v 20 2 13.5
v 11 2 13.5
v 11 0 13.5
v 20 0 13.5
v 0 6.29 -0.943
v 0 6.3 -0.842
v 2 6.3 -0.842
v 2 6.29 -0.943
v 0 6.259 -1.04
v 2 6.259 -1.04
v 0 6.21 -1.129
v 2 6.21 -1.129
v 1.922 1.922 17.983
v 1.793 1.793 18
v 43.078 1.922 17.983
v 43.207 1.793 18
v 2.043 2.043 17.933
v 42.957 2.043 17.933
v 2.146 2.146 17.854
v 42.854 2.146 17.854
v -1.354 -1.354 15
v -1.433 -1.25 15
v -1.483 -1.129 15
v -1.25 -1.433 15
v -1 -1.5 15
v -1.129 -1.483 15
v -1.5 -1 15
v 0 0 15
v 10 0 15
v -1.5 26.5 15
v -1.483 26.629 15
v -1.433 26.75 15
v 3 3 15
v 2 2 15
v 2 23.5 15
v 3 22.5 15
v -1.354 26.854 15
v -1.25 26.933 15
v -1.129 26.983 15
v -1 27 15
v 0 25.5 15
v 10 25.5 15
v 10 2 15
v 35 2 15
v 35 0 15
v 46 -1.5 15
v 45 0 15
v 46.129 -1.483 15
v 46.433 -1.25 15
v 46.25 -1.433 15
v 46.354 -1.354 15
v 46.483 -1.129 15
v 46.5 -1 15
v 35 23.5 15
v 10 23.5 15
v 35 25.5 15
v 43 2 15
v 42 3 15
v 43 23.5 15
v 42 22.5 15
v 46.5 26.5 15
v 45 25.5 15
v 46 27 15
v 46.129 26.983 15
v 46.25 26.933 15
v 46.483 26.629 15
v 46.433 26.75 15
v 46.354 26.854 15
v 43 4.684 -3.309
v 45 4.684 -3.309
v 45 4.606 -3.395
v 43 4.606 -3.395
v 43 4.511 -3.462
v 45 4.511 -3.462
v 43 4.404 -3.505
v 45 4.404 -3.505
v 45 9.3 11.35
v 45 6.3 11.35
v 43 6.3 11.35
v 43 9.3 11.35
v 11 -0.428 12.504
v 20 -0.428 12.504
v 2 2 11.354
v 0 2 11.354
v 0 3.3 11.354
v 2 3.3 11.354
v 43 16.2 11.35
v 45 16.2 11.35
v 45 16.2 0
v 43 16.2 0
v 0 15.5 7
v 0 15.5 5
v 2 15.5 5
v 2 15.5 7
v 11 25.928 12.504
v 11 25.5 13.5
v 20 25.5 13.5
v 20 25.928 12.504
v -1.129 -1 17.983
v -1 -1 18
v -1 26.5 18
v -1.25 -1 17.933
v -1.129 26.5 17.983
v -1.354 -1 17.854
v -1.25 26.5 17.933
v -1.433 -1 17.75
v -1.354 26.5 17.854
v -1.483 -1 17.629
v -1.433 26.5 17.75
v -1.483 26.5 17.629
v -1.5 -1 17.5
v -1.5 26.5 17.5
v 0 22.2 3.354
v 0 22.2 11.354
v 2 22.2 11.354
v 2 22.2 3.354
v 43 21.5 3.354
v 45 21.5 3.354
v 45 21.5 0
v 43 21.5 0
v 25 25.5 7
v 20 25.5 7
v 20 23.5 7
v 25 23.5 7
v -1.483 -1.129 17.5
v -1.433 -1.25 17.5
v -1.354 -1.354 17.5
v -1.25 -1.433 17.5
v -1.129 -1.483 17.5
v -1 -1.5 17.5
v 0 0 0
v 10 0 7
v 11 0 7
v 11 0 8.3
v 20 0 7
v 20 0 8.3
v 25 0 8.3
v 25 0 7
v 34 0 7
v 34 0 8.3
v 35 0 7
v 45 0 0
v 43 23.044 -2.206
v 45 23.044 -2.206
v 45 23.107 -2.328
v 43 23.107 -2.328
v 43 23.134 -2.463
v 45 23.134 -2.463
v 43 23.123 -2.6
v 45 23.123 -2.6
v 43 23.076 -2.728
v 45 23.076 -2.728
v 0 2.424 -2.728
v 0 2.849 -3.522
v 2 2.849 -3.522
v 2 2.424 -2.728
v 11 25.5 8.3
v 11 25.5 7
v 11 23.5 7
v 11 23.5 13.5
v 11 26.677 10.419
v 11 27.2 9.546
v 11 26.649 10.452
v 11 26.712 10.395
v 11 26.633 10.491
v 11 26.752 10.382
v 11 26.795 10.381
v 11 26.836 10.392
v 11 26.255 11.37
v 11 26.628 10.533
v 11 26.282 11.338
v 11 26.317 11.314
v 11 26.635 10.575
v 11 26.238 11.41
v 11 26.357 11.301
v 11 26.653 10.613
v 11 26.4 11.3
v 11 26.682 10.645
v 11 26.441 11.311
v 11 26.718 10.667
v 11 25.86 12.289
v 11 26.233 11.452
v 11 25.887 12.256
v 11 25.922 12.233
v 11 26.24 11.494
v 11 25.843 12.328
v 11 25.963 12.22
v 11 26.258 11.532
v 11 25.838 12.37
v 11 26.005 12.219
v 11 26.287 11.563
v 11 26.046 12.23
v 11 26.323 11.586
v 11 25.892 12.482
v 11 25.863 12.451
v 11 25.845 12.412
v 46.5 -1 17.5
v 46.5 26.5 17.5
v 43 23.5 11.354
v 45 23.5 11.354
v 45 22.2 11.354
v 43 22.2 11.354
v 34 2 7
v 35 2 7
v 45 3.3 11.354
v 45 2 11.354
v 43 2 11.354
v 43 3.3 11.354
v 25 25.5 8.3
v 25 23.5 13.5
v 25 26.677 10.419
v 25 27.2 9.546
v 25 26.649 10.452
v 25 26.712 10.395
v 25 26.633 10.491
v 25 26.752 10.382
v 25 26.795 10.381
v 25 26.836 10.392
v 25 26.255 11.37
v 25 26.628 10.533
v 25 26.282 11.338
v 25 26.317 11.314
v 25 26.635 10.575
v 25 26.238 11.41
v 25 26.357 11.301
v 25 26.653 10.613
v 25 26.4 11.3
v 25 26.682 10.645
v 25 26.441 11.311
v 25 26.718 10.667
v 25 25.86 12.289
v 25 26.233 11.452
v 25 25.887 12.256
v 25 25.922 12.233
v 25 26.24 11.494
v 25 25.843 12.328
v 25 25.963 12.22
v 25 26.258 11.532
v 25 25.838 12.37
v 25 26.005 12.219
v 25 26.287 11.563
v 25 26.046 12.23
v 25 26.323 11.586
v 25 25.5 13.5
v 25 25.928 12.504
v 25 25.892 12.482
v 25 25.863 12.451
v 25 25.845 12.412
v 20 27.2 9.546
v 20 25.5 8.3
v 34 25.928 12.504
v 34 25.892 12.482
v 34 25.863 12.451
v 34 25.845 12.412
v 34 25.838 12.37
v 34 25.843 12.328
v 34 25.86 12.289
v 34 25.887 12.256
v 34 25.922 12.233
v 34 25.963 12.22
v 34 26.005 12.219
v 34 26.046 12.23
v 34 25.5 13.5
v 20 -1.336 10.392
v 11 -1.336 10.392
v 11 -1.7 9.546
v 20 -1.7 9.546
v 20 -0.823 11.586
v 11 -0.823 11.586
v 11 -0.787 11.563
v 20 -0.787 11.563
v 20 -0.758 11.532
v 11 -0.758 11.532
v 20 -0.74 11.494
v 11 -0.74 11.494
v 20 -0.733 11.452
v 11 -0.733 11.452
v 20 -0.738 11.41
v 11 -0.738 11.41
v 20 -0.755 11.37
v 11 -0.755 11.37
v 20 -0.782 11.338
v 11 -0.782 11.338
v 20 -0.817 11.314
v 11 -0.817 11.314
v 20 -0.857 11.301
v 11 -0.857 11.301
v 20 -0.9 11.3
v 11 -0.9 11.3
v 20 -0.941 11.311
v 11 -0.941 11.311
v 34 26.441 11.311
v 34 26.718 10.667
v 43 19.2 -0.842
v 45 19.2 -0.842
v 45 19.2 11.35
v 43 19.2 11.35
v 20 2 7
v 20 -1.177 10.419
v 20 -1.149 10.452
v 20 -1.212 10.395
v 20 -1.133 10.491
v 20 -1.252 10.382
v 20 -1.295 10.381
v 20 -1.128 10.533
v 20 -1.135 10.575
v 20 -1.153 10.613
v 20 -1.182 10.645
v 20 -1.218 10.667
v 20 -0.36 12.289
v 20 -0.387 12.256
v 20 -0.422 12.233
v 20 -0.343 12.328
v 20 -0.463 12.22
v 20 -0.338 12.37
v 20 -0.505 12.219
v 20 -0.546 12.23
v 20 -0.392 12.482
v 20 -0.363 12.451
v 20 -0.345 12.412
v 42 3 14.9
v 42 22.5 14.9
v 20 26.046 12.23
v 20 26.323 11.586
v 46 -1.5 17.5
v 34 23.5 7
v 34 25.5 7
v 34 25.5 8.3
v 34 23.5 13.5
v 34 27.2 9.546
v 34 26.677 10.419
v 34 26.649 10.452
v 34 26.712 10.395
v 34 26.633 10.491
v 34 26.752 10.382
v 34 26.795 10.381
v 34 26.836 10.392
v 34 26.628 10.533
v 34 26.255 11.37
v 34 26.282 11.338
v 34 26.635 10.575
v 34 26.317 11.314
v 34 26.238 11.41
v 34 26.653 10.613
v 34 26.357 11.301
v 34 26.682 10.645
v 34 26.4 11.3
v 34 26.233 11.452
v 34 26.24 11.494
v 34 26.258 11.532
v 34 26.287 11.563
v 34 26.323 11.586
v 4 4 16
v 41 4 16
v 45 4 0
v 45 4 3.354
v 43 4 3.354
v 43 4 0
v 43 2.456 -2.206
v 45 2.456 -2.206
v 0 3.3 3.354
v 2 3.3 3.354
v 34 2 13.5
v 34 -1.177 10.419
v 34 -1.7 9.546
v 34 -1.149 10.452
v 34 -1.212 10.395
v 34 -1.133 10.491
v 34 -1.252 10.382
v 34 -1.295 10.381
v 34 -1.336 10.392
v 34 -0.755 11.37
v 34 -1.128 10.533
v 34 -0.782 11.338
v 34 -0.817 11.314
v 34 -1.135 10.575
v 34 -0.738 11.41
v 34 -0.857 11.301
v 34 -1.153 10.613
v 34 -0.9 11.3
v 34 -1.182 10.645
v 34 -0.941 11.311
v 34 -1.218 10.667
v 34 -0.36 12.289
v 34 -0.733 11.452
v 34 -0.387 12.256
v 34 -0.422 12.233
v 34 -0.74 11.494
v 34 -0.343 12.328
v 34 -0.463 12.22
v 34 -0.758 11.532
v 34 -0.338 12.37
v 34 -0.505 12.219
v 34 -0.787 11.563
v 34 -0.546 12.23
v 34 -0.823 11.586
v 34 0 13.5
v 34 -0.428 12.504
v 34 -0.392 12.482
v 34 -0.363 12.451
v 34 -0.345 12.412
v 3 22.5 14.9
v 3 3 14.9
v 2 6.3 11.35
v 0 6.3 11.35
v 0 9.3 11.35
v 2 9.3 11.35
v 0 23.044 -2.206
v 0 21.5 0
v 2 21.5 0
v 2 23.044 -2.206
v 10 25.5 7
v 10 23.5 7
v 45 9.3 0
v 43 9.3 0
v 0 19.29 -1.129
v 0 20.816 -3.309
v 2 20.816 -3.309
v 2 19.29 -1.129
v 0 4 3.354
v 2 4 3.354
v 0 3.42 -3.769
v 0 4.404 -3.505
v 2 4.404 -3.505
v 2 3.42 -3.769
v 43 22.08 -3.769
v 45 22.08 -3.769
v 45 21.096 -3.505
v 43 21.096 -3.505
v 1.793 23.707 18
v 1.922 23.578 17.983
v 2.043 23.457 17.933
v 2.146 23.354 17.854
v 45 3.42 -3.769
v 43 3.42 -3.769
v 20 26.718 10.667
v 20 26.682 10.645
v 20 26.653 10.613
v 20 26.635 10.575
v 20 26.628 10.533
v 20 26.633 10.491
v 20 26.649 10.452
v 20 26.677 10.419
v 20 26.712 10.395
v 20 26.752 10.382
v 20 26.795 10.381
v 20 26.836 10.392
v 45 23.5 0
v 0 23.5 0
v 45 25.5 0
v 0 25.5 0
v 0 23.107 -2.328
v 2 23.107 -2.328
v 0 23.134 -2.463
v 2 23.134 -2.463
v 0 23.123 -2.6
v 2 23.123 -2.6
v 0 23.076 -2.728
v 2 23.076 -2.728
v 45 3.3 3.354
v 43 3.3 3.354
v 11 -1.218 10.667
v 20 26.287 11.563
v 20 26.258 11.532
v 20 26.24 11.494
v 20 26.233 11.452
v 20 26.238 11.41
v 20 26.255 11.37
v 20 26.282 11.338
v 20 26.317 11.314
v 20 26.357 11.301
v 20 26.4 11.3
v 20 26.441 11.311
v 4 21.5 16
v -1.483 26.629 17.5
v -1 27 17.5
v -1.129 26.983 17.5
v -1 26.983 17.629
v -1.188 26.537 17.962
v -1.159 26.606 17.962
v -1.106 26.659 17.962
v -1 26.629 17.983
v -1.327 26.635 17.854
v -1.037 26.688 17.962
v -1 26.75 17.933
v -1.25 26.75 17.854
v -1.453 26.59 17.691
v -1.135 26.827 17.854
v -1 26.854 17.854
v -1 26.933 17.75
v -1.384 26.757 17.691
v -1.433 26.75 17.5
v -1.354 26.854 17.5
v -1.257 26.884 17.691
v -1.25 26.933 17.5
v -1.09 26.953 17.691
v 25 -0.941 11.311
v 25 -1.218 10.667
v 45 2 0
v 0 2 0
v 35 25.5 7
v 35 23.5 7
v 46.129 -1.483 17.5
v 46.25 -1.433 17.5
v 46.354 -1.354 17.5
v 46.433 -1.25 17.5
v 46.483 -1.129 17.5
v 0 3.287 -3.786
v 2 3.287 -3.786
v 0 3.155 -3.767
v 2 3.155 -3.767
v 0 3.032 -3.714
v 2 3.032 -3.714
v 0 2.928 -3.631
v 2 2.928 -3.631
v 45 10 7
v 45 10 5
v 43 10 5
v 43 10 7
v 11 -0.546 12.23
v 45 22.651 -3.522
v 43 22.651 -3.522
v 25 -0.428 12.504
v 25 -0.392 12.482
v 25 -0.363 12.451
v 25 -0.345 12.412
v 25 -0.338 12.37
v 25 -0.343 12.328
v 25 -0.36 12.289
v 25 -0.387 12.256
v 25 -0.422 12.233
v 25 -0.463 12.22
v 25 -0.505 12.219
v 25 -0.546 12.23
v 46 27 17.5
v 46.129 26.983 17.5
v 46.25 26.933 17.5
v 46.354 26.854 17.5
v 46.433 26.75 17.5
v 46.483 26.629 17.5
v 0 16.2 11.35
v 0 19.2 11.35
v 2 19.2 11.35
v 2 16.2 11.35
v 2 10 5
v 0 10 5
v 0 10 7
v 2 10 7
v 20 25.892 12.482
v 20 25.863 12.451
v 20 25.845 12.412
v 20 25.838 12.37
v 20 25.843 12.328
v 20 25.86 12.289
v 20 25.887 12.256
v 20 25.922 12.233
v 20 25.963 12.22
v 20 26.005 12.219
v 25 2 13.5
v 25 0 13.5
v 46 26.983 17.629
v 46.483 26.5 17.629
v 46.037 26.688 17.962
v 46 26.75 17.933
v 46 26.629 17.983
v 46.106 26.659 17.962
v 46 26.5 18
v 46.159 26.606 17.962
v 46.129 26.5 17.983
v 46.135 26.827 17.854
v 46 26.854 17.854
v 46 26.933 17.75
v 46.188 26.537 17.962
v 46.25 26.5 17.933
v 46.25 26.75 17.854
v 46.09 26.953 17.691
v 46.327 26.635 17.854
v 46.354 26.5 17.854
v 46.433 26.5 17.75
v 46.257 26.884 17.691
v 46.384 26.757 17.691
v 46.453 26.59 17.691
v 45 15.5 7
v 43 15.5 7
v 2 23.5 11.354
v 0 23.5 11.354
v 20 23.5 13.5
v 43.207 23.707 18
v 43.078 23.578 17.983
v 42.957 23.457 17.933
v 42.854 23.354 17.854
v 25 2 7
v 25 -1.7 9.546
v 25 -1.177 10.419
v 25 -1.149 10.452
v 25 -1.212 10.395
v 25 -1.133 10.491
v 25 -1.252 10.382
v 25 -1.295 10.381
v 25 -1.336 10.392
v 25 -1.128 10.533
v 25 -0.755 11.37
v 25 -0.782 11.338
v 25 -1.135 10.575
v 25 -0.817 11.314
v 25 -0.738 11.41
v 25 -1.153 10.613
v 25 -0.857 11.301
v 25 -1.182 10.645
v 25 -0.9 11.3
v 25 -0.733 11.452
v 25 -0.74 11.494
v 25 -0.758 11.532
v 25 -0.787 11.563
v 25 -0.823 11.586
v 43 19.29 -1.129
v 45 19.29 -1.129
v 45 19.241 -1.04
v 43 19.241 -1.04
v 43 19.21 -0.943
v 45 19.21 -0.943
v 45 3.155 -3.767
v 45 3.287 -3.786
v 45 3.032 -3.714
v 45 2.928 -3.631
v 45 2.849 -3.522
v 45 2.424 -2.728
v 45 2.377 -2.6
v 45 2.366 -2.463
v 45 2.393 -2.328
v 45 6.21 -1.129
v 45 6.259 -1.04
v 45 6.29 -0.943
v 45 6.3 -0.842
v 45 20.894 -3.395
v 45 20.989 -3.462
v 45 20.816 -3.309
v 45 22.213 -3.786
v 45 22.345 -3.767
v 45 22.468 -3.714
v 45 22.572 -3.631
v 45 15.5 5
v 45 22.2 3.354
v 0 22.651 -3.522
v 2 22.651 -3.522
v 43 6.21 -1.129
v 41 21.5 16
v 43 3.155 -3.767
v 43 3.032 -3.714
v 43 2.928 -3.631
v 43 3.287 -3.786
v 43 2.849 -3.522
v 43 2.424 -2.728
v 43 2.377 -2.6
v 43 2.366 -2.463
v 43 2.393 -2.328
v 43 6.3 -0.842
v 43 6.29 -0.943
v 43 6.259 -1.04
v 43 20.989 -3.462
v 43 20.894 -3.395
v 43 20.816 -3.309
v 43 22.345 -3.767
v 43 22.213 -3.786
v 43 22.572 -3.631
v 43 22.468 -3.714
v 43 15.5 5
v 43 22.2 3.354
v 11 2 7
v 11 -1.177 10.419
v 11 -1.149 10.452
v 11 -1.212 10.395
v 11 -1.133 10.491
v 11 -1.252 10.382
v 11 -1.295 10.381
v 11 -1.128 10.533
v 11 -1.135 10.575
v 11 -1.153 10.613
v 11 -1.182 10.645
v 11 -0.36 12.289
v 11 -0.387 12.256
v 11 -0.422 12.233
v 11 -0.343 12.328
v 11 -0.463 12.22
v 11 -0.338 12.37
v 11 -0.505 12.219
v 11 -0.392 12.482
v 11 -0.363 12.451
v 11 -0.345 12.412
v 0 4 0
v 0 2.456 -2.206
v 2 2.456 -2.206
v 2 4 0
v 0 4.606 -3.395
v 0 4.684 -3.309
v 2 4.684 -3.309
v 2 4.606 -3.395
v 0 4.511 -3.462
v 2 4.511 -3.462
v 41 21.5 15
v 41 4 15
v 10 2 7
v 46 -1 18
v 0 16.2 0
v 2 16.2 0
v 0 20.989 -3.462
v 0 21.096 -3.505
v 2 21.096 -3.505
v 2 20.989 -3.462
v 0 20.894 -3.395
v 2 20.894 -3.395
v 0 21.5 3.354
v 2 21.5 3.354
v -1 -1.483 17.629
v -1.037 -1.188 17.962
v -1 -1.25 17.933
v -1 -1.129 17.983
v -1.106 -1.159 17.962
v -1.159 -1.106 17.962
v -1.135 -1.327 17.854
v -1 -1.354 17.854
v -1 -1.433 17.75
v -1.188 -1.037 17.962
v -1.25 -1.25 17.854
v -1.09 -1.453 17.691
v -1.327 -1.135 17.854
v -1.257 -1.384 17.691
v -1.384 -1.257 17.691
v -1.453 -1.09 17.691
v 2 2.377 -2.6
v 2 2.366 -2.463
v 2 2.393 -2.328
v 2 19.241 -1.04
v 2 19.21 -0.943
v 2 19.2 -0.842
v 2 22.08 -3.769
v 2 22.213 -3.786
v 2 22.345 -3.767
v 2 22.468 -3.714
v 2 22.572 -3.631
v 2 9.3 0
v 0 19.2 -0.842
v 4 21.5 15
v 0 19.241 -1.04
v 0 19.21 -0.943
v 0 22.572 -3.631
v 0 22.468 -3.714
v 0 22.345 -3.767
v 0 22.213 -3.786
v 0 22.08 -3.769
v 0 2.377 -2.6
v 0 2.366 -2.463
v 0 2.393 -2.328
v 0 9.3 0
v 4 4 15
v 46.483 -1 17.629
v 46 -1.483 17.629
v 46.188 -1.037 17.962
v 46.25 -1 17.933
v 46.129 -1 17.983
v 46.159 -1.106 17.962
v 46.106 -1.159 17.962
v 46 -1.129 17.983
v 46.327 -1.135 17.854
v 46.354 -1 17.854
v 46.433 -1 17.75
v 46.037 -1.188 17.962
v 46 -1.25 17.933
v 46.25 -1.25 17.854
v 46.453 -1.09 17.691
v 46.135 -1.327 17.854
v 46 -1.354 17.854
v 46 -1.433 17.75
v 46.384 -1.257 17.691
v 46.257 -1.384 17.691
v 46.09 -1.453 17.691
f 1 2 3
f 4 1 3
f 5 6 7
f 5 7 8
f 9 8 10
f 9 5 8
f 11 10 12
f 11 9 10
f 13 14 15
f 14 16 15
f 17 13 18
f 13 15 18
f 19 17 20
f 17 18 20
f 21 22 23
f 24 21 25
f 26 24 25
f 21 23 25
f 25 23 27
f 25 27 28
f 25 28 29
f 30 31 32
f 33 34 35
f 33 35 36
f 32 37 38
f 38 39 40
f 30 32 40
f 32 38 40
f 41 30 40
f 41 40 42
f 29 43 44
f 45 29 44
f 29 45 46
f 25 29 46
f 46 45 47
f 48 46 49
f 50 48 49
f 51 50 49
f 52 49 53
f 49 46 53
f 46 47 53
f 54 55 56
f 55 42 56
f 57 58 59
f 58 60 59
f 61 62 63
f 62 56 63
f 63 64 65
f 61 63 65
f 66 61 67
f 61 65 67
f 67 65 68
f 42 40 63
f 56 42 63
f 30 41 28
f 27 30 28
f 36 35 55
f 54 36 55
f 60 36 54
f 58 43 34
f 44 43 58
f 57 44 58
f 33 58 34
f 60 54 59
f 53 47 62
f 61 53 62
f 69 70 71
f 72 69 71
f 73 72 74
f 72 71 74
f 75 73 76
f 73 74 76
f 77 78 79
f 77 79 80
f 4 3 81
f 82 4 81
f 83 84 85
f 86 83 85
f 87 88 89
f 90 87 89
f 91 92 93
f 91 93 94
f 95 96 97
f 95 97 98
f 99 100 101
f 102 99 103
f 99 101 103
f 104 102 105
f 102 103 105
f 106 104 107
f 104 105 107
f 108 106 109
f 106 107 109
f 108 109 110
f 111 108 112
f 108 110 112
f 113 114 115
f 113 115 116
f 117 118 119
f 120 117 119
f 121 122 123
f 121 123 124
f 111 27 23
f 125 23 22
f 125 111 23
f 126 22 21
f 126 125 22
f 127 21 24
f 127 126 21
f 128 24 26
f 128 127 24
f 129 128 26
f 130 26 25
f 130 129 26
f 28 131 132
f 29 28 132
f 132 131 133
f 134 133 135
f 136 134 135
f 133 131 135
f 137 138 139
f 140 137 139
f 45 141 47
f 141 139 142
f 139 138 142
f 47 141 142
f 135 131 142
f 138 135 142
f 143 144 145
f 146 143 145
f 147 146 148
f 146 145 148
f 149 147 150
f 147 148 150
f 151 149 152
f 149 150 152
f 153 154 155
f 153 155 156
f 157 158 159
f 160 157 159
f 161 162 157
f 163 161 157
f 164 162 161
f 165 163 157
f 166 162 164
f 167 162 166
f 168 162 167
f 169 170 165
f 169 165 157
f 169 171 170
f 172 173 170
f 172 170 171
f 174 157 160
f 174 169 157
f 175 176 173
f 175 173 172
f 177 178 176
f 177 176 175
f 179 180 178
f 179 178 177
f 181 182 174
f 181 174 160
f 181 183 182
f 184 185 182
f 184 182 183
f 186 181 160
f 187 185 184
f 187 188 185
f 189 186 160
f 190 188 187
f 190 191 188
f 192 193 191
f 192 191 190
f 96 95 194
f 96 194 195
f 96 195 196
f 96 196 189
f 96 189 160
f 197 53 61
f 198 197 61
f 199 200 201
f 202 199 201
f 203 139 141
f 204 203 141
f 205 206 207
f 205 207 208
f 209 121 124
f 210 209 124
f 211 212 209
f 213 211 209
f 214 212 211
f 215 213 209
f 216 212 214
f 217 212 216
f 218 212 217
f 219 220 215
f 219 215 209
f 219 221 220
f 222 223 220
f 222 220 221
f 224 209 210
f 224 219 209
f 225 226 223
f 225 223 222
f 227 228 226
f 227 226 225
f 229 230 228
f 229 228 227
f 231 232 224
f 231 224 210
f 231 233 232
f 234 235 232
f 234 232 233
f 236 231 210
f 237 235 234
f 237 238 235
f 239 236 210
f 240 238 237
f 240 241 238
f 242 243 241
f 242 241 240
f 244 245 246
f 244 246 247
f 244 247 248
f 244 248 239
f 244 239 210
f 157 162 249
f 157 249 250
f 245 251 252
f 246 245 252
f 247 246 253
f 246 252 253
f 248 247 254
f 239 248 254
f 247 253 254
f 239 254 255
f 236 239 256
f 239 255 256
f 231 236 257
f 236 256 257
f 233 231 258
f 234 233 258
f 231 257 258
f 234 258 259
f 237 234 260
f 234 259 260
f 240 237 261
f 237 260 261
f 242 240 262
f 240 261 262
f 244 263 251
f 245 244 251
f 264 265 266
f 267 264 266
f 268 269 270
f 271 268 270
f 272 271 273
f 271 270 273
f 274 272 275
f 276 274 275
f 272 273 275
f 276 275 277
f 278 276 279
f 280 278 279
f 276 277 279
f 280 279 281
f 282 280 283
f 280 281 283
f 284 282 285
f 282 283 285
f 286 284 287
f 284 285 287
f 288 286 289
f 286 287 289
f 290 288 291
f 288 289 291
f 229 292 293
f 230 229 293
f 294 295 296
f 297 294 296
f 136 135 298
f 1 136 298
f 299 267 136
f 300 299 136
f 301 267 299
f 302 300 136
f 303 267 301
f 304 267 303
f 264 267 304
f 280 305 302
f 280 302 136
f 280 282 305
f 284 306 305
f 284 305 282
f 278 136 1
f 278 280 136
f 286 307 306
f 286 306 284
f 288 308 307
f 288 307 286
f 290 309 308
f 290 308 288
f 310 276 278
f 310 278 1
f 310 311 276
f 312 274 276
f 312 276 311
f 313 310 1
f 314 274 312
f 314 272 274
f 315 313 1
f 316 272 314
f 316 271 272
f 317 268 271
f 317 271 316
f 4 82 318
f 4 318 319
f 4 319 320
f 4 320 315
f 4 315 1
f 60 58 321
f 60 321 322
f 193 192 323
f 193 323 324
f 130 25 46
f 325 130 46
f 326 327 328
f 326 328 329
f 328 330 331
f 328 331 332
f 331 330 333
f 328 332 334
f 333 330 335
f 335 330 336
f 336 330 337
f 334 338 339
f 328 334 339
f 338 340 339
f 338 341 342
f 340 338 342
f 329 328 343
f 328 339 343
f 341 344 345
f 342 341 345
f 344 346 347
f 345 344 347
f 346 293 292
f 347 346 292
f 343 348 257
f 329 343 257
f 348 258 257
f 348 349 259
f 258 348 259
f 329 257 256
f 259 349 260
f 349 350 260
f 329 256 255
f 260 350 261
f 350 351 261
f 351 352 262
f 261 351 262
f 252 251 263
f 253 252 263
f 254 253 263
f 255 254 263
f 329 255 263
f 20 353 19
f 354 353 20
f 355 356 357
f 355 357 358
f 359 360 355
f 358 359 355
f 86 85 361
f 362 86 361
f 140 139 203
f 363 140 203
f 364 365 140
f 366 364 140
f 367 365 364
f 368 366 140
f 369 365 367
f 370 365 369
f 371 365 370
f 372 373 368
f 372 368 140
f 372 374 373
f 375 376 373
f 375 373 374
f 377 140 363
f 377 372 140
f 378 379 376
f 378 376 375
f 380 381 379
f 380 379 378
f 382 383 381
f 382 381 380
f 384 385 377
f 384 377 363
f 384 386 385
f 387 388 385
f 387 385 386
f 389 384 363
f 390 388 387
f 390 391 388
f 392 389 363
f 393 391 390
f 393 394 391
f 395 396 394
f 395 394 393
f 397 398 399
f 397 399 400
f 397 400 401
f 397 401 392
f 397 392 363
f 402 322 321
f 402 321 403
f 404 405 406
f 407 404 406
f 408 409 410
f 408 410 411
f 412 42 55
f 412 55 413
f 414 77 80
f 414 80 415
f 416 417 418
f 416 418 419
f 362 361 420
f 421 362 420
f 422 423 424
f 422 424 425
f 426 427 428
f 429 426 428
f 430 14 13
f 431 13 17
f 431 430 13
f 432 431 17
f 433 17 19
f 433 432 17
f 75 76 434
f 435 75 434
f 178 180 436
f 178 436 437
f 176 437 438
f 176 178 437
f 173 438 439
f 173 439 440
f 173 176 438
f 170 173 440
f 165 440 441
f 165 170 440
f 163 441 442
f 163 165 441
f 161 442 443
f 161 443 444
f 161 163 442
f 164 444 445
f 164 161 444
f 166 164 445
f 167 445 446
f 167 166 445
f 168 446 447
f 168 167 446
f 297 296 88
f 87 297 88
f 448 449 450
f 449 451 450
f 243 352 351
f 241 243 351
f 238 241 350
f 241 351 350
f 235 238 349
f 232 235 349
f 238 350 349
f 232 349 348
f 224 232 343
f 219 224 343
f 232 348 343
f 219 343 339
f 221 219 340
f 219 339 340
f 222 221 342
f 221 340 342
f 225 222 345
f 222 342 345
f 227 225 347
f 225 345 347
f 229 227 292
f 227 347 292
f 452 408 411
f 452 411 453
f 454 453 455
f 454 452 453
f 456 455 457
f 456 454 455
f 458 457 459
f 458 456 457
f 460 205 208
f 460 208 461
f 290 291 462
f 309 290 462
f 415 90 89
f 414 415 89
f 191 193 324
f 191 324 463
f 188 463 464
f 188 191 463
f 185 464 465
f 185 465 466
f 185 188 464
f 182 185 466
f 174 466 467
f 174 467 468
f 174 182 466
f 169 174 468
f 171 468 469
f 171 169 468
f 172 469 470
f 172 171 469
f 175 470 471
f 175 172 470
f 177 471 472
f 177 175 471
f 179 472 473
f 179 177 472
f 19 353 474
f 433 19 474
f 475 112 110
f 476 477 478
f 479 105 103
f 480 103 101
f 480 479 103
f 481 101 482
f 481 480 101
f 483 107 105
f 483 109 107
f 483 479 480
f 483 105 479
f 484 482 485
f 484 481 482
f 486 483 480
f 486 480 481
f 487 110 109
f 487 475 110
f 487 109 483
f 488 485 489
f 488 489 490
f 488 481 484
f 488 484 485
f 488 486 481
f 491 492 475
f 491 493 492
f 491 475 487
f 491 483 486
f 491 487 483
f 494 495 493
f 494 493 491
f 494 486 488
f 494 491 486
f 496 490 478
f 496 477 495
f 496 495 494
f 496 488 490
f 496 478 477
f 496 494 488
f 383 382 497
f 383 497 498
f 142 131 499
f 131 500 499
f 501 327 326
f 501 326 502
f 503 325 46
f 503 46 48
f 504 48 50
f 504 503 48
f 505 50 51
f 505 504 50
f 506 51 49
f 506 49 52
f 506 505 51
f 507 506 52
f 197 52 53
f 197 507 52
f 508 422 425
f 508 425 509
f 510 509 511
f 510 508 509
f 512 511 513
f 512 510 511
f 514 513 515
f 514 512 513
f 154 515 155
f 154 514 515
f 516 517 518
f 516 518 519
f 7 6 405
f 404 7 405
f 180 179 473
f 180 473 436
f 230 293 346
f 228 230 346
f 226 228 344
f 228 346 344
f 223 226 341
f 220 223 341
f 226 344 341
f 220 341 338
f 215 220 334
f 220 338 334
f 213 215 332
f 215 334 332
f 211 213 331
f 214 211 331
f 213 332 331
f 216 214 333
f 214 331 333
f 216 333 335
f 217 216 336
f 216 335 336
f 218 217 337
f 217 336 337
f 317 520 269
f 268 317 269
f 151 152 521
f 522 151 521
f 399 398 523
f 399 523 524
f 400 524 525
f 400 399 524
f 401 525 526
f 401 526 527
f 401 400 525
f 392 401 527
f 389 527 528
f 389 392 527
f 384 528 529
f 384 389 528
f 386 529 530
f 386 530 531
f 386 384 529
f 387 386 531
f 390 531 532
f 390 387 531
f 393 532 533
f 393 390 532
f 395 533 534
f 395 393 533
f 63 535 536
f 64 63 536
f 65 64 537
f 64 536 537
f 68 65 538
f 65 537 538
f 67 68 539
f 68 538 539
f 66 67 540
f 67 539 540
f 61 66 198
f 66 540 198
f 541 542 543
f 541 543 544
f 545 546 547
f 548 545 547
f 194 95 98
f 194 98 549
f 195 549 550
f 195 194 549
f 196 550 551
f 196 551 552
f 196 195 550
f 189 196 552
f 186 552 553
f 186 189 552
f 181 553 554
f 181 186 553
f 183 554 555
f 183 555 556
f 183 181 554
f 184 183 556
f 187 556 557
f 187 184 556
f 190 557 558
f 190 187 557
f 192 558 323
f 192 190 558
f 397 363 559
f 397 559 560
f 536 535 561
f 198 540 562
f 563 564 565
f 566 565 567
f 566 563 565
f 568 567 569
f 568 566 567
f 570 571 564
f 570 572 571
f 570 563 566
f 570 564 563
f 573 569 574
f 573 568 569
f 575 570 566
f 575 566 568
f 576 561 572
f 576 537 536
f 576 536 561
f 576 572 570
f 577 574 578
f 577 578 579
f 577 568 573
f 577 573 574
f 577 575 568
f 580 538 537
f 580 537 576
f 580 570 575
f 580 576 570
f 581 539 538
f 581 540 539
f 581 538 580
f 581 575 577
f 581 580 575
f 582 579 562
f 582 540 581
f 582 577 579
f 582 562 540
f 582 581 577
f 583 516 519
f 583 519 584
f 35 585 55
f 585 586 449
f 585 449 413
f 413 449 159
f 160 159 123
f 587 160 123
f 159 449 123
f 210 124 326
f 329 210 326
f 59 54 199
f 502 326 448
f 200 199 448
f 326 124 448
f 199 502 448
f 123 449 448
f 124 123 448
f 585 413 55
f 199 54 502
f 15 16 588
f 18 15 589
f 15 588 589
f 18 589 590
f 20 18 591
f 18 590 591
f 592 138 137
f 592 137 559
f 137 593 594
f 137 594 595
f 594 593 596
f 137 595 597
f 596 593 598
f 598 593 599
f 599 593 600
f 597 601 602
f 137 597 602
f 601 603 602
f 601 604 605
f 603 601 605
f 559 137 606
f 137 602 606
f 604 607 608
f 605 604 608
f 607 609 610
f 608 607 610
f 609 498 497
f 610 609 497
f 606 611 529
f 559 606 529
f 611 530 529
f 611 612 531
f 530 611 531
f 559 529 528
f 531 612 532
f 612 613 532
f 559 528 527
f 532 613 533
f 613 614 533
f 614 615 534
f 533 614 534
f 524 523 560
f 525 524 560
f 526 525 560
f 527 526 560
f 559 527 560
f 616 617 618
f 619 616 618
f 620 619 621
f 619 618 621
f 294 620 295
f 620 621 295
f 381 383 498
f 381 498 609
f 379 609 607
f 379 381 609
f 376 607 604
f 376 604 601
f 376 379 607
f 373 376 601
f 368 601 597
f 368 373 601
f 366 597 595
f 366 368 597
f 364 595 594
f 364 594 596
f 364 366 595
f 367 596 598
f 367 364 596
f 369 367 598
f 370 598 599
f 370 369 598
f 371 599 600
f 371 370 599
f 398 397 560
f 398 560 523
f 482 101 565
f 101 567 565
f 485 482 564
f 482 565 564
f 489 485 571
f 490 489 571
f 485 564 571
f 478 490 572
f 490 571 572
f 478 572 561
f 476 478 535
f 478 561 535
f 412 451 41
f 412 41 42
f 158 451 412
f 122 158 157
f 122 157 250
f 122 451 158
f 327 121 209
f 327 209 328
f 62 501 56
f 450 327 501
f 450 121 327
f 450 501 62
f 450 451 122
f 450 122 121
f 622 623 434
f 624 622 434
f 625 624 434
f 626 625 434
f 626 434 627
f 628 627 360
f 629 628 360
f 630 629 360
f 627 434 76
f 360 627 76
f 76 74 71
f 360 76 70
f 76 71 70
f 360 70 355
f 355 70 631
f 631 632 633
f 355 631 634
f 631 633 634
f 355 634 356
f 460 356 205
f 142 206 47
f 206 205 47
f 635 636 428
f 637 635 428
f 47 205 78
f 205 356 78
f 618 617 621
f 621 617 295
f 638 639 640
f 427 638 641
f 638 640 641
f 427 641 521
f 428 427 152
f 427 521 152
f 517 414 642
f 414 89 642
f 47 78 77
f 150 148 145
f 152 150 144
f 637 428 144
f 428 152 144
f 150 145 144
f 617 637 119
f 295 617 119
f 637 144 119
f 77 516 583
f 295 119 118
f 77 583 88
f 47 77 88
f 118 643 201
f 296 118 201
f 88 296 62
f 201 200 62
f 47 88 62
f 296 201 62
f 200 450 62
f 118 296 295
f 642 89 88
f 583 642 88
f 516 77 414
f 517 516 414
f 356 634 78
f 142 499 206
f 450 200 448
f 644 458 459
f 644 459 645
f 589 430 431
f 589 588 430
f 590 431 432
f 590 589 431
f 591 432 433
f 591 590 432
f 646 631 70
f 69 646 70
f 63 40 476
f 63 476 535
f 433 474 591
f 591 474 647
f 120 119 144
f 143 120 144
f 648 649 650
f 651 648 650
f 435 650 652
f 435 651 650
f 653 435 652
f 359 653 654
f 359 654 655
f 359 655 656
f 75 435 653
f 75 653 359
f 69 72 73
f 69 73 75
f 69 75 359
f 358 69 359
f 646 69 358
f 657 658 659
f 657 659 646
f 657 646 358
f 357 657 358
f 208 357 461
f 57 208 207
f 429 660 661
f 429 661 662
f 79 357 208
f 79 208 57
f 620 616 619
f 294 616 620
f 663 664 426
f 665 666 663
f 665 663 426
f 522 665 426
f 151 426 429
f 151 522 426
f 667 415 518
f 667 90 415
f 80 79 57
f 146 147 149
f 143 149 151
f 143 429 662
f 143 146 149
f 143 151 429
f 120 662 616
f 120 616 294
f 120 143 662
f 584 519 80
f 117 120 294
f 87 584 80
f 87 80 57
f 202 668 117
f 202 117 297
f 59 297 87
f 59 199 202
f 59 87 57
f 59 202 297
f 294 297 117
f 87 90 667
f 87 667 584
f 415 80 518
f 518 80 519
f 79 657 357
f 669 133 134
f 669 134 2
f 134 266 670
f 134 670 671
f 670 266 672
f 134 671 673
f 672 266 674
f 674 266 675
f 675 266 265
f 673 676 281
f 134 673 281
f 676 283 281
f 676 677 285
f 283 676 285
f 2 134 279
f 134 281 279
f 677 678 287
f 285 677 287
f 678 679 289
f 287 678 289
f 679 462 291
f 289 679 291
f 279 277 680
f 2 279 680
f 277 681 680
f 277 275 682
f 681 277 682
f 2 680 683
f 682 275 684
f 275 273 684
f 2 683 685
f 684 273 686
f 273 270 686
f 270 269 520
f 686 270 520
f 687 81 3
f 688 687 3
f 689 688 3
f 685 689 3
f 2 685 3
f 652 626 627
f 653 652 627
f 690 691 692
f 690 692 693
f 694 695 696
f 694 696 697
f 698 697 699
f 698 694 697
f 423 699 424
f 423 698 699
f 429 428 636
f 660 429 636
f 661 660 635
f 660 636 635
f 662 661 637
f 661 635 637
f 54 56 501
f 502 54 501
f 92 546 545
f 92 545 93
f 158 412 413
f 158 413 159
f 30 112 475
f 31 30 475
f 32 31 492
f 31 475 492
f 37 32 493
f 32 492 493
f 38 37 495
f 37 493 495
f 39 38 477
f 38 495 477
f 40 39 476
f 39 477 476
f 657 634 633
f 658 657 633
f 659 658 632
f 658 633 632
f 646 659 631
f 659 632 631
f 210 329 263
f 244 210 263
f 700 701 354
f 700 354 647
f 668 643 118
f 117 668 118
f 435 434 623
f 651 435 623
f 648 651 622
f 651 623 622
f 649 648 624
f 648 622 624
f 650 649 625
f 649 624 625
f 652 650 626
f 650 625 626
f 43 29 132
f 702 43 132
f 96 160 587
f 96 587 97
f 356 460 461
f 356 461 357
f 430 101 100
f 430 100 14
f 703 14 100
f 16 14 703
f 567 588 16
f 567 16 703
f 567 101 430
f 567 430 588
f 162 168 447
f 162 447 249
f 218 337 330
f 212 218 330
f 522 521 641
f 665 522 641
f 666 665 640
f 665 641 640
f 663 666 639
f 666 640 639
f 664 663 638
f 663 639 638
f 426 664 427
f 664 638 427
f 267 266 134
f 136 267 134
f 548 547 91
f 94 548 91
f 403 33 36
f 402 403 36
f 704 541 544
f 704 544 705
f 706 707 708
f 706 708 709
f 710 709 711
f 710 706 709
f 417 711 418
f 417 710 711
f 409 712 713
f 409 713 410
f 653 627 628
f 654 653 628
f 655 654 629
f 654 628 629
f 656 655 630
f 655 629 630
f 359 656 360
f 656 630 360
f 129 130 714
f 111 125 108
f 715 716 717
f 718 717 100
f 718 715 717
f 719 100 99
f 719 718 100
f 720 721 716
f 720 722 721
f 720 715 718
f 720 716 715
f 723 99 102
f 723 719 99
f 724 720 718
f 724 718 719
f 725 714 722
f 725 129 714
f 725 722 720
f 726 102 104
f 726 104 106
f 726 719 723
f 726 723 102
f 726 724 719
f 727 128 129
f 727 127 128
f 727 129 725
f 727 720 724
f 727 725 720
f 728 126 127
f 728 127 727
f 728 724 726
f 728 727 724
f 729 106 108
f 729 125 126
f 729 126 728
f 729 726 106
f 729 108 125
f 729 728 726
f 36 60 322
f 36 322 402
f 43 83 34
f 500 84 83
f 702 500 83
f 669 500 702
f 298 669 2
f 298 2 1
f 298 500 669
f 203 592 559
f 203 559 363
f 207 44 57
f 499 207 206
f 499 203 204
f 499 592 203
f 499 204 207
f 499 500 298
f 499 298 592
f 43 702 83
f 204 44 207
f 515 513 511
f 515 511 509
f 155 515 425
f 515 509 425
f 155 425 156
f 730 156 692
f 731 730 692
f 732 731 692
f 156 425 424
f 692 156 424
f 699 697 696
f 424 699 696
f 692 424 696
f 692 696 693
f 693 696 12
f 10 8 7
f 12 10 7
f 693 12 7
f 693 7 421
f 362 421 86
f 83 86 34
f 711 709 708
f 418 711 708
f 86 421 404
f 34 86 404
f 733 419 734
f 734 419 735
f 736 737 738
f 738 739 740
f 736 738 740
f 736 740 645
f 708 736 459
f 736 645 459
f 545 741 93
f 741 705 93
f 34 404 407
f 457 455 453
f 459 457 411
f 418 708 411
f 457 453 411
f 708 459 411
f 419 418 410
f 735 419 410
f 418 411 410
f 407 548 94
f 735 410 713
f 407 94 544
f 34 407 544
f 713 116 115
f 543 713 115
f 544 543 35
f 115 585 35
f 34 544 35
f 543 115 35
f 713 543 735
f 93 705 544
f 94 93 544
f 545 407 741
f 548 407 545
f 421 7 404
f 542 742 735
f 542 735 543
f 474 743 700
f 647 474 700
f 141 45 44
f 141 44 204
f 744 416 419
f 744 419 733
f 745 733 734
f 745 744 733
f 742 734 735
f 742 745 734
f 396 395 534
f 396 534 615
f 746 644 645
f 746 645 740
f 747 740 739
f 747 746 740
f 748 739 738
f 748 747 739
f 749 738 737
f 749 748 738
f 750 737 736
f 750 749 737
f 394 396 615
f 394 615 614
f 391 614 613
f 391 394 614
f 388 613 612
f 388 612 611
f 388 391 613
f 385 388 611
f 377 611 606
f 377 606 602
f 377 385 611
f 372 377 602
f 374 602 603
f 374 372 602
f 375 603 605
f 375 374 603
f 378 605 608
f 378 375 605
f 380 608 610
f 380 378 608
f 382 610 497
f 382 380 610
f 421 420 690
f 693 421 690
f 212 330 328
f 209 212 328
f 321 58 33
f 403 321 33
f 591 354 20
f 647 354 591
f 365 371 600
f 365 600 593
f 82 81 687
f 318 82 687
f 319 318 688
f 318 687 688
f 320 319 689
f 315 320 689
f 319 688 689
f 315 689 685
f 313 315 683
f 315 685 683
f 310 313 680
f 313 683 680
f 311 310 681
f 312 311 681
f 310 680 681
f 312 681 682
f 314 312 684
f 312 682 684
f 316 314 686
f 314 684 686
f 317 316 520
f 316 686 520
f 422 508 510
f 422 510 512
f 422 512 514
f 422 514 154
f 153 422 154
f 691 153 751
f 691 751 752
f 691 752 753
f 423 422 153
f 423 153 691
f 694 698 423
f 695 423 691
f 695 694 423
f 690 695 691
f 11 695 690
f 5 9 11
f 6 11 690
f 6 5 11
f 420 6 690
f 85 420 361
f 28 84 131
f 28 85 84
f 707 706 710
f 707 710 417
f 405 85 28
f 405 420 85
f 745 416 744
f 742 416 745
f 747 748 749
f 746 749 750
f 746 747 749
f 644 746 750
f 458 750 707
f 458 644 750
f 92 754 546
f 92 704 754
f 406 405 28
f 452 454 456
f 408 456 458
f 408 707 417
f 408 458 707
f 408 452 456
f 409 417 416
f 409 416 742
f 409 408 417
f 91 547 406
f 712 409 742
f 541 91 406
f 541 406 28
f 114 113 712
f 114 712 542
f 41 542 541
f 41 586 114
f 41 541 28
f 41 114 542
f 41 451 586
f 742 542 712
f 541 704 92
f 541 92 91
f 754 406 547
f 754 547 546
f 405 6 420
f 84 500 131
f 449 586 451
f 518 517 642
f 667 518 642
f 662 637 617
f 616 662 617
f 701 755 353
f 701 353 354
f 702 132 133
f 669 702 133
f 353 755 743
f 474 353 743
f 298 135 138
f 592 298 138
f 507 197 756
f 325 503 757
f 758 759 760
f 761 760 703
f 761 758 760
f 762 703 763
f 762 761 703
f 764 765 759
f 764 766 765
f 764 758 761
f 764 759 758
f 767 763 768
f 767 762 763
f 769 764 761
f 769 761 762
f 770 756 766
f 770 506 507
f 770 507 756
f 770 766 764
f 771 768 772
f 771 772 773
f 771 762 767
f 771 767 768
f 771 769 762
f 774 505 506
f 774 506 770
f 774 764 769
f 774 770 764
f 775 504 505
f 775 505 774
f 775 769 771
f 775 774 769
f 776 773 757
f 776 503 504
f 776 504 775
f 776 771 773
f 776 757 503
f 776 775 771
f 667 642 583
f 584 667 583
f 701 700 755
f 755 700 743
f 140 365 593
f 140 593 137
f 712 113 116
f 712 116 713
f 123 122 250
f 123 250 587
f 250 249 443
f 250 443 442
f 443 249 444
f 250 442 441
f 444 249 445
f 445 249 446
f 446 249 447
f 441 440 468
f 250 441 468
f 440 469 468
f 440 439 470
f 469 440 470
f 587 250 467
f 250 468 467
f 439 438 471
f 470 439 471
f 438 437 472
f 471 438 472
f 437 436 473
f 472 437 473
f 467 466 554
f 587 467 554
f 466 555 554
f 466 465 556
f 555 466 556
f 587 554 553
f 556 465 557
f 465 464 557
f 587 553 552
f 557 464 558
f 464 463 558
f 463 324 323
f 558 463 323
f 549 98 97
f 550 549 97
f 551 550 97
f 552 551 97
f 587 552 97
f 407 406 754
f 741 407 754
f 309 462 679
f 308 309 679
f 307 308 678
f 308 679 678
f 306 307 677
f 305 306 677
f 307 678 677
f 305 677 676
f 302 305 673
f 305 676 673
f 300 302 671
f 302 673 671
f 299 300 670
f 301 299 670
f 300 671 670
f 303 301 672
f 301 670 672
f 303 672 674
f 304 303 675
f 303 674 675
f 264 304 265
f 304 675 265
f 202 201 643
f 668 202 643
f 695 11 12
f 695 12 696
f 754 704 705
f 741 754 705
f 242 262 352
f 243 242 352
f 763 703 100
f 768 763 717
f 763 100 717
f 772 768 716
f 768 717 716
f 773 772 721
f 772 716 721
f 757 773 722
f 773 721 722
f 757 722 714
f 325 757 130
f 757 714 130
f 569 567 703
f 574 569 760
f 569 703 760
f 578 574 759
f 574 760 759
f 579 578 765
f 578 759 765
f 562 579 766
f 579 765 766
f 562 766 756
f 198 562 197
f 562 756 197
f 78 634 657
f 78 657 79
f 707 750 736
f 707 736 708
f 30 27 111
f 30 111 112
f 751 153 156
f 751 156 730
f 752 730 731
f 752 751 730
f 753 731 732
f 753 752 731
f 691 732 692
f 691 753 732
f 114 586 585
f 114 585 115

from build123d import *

# Parameters (mm, degrees)
SKETCH1_W            = 45
SKETCH1_H            = 25.5
SKETCH1_W_2          = 41
SKETCH1_H_2          = 21.5
BOSS_EXTRUDE1_DEPTH  = 15
SKETCH2_W            = 48
SKETCH2_H            = 28.5
SKETCH2_W_2          = 37
SKETCH2_H_2          = 17.5
BOSS_EXTRUDE2_DEPTH  = 3
FILLET1_R            = 0.5
FILLET2_R            = 0.5
CHAMFER1_SIZE        = 2
FILLET3_R            = 0.5
SKETCH3_W            = 39
SKETCH3_H            = 19.5
BOSS_EXTRUDE3_DEPTH  = 0.1
SKETCH4_W            = 2
SKETCH4_H            = 5.5
CUT_EXTRUDE1_DEPTH   = 7
BOSS_EXTRUDE4_DEPTH  = 2
SKETCH6_W            = 25
SKETCH6_H            = 8
CUT_EXTRUDE4_DEPTH   = 2
BOSS_EXTRUDE5_DEPTH  = 9
MIRROR5_COPY_1_DEPTH = 9


with BuildPart() as part:
    # Sketch1 → Boss-Extrude1 (new body)
    with BuildSketch(Plane.XY):
        with Locations((22.5, 12.75)):
            Rectangle(SKETCH1_W, SKETCH1_H)
        with Locations((22.5, 12.75)):
            Rectangle(SKETCH1_W_2, SKETCH1_H_2, mode=Mode.SUBTRACT)
    extrude(amount=BOSS_EXTRUDE1_DEPTH)

    # Sketch2 → Boss-Extrude2 (add)
    with BuildSketch(Plane.XY.offset(15)):
        with Locations((22.5, 12.75)):
            Rectangle(SKETCH2_W, SKETCH2_H)
        with Locations((22.5, 12.75)):
            Rectangle(SKETCH2_W_2, SKETCH2_H_2, mode=Mode.SUBTRACT)
    extrude(amount=BOSS_EXTRUDE2_DEPTH)

    # Fillet1
    fillet1_edges = [part.edges().sort_by_distance(p)[0] for p in [
        (46.5, -1.5, 16.5),
        (46.5, 27, 16.5),
        (-1.5, 27, 16.5),
        (-1.5, -1.5, 16.5),
    ]]
    fillet(fillet1_edges, radius=FILLET1_R)

    # Fillet2
    fillet2_edges = [part.edges().sort_by_distance(p)[0] for p in [
        (22.5, 27, 18),
        (46.5, 12.75, 18),
        (-1.5, 12.75, 18),
        (22.5, -1.5, 18),
        (-1.353553391, 26.853553391, 18),
        (-1.353553391, -1.353553391, 18),
        (46.353553391, -1.353553391, 18),
        (46.353553391, 26.853553391, 18),
    ]]
    fillet(fillet2_edges, radius=FILLET2_R)

    # Chamfer1
    chamfer1_edges = [part.edges().sort_by_distance(p)[0] for p in [
        (41, 12.75, 18),
        (22.5, 21.5, 18),
        (4, 12.75, 18),
        (22.5, 4, 18),
    ]]
    chamfer(chamfer1_edges, length=CHAMFER1_SIZE)

    # Fillet3
    fillet3_edges = [part.edges().sort_by_distance(p)[0] for p in [
        (22.5, 2, 18),
        (2, 12.75, 18),
        (22.5, 23.5, 18),
        (43, 12.75, 18),
    ]]
    fillet(fillet3_edges, radius=FILLET3_R)

    # Sketch3 → Boss-Extrude3 (add)
    with BuildSketch(Plane(origin=(0, 0, 15), x_dir=(-1, 0, 0), z_dir=(0, 0, -1))):
        with Locations((-22.5, 12.75)):
            Rectangle(SKETCH3_W, SKETCH3_H)
    extrude(amount=BOSS_EXTRUDE3_DEPTH)

    # Sketch4 → Cut-Extrude1 (cut)
    with BuildSketch(Plane.ZY):
        Polygon((0, 25.5), (0, 23.5), (11.354344123, 23.5), (11.354344123, 22.2), (3.354344123, 22.2), (3.354344123, 21.5), (-1.052747885, 21.5), (-1.052747885, 19.2), (11.35, 19.2), (11.35, 16.2), (-2.740421073, 16.2), (-2.133707004, 24.508604023), align=None)
        Polygon((-2.133707004, 0.991395977), (0, 0), (0, 2), (11.354344123, 2), (11.354344123, 3.3), (3.354344123, 3.3), (3.354344123, 4), (-1.052747885, 4), (-1.052747885, 6.3), (11.35, 6.3), (11.35, 9.3), (-2.740421073, 9.3), align=None)
        with Locations((6, 12.75)):
            Rectangle(SKETCH4_W, SKETCH4_H)
    cut_extrude1 = extrude(amount=-CUT_EXTRUDE1_DEPTH, mode=Mode.SUBTRACT)

    # Mirror1: Cut-Extrude1 across plane
    add(cut_extrude1.mirror(Plane(origin=(22.5, 0, 0), x_dir=(0, 0, 1), z_dir=(1, 0, 0))), mode=Mode.SUBTRACT)

    # Sketch5 → Boss-Extrude4 (add)
    with BuildSketch(Plane.ZY):
        with BuildLine():
            Line((0, 21.5), (-2.205642109, 23.044407231))
            ThreePointArc((-2.205642109, 23.044407231), (-2.462636709, 23.13394276), (-2.728457708, 23.075615822))
            Line((-2.728457708, 23.075615822), (-3.522154827, 22.650614026))
            ThreePointArc((-3.522154827, 22.650614026), (-3.745020462, 22.408367067), (-3.768996943, 22.08007176))
            Line((-3.768996943, 22.08007176), (-3.504631096, 21.096282354))
            ThreePointArc((-3.504631096, 21.096282354), (-3.431234223, 20.939104177), (-3.308549817, 20.816463984))
            Line((-3.308549817, 20.816463984), (-1.129138824, 19.290423978))
            ThreePointArc((-1.129138824, 19.290423978), (-0.992703505, 19.223141525), (-0.842350606, 19.2))
            Line((-0.842350606, 19.2), (0, 19.2))
            Line((0, 19.2), (0, 21.5))
        make_face()
        with BuildLine():
            Line((-3.522154827, 2.849385974), (-2.728457708, 2.424384178))
            ThreePointArc((-2.728457708, 2.424384178), (-2.462636709, 2.36605724), (-2.205642109, 2.455592769))
            Line((-2.205642109, 2.455592769), (0, 4))
            Line((0, 4), (0, 6.3))
            Line((0, 6.3), (-0.842350606, 6.3))
            ThreePointArc((-0.842350606, 6.3), (-0.992703505, 6.276858475), (-1.129138824, 6.209576022))
            Line((-1.129138824, 6.209576022), (-3.308549817, 4.683536016))
            ThreePointArc((-3.308549817, 4.683536016), (-3.431234223, 4.560895823), (-3.504631096, 4.403717646))
            Line((-3.504631096, 4.403717646), (-3.768996943, 3.41992824))
            ThreePointArc((-3.768996943, 3.41992824), (-3.745020462, 3.091632933), (-3.522154827, 2.849385974))
        make_face()
    boss_extrude4 = extrude(amount=-BOSS_EXTRUDE4_DEPTH)

    # Mirror3: Boss-Extrude4 across plane
    add(boss_extrude4.mirror(Plane(origin=(22.5, 0, 0), x_dir=(0, 0, 1), z_dir=(1, 0, 0))))

    # Sketch6 → Cut-Extrude4 (cut)
    with BuildSketch(Plane(origin=(0, 25.5, 0), x_dir=(1, 0, 0), z_dir=(0, 1, 0))):
        with Locations((22.5, -11)):
            Rectangle(SKETCH6_W, SKETCH6_H)
    cut_extrude4 = extrude(amount=-CUT_EXTRUDE4_DEPTH, mode=Mode.SUBTRACT)

    # Sketch7 → Boss-Extrude5 (add)
    with BuildSketch(Plane(origin=(11, 0, 0), x_dir=(0, 0, -1), z_dir=(1, 0, 0))):
        with BuildLine():
            Line((-7, 23.5), (-13.5, 23.5))
            Line((-13.5, 23.5), (-13.5, 25.5))
            Line((-13.5, 25.5), (-12.50438631, 25.92802582))
            ThreePointArc((-12.50438631, 25.92802582), (-12.308138031, 25.84987504), (-12.229830148, 26.046060684))
            Line((-12.229830148, 26.046060684), (-11.58568767, 26.322984972))
            ThreePointArc((-11.58568767, 26.322984972), (-11.389415731, 26.244779249), (-11.311131441, 26.441019864))
            Line((-11.311131441, 26.441019864), (-10.666989007, 26.717944134))
            ThreePointArc((-10.666989007, 26.717944134), (-10.47069343, 26.639683459), (-10.392432756, 26.835979036))
            Line((-10.392432756, 26.835979036), (-9.545698193, 27.2))
            Line((-9.545698193, 27.2), (-8.3, 25.5))
            Line((-8.3, 25.5), (-7, 25.5))
            Line((-7, 25.5), (-7, 23.5))
        make_face()
    boss_extrude5 = extrude(amount=BOSS_EXTRUDE5_DEPTH)

    # Mirror4: Boss-Extrude5 across plane
    add(boss_extrude5.mirror(Plane(origin=(22.5, 0, 0), x_dir=(0, 0, 1), z_dir=(1, 0, 0))))

    # Mirror5: Cut-Extrude4, Boss-Extrude5 across plane
    add(cut_extrude4.mirror(Plane.ZX.offset(12.75)), mode=Mode.SUBTRACT)
    add(boss_extrude5.mirror(Plane.ZX.offset(12.75)))

    # Mirror5 copy 1 sketch → Mirror5 copy 1 (add)
    with BuildSketch(Plane(origin=(34, 25.5, 0), x_dir=(0, 0, -1), z_dir=(-1, 0, 0))):
        with BuildLine():
            Line((-7, 23.5), (-13.5, 23.5))
            Line((-13.5, 23.5), (-13.5, 25.5))
            Line((-13.5, 25.5), (-12.50438631, 25.92802582))
            ThreePointArc((-12.50438631, 25.92802582), (-12.308138031, 25.84987504), (-12.229830148, 26.046060684))
            Line((-12.229830148, 26.046060684), (-11.58568767, 26.322984972))
            ThreePointArc((-11.58568767, 26.322984972), (-11.389415731, 26.244779249), (-11.311131441, 26.441019864))
            Line((-11.311131441, 26.441019864), (-10.666989007, 26.717944134))
            ThreePointArc((-10.666989007, 26.717944134), (-10.47069343, 26.639683459), (-10.392432756, 26.835979036))
            Line((-10.392432756, 26.835979036), (-9.545698193, 27.2))
            Line((-9.545698193, 27.2), (-8.3, 25.5))
            Line((-8.3, 25.5), (-7, 25.5))
            Line((-7, 25.5), (-7, 23.5))
        make_face()
    extrude(amount=MIRROR5_COPY_1_DEPTH)


solid = part.part
